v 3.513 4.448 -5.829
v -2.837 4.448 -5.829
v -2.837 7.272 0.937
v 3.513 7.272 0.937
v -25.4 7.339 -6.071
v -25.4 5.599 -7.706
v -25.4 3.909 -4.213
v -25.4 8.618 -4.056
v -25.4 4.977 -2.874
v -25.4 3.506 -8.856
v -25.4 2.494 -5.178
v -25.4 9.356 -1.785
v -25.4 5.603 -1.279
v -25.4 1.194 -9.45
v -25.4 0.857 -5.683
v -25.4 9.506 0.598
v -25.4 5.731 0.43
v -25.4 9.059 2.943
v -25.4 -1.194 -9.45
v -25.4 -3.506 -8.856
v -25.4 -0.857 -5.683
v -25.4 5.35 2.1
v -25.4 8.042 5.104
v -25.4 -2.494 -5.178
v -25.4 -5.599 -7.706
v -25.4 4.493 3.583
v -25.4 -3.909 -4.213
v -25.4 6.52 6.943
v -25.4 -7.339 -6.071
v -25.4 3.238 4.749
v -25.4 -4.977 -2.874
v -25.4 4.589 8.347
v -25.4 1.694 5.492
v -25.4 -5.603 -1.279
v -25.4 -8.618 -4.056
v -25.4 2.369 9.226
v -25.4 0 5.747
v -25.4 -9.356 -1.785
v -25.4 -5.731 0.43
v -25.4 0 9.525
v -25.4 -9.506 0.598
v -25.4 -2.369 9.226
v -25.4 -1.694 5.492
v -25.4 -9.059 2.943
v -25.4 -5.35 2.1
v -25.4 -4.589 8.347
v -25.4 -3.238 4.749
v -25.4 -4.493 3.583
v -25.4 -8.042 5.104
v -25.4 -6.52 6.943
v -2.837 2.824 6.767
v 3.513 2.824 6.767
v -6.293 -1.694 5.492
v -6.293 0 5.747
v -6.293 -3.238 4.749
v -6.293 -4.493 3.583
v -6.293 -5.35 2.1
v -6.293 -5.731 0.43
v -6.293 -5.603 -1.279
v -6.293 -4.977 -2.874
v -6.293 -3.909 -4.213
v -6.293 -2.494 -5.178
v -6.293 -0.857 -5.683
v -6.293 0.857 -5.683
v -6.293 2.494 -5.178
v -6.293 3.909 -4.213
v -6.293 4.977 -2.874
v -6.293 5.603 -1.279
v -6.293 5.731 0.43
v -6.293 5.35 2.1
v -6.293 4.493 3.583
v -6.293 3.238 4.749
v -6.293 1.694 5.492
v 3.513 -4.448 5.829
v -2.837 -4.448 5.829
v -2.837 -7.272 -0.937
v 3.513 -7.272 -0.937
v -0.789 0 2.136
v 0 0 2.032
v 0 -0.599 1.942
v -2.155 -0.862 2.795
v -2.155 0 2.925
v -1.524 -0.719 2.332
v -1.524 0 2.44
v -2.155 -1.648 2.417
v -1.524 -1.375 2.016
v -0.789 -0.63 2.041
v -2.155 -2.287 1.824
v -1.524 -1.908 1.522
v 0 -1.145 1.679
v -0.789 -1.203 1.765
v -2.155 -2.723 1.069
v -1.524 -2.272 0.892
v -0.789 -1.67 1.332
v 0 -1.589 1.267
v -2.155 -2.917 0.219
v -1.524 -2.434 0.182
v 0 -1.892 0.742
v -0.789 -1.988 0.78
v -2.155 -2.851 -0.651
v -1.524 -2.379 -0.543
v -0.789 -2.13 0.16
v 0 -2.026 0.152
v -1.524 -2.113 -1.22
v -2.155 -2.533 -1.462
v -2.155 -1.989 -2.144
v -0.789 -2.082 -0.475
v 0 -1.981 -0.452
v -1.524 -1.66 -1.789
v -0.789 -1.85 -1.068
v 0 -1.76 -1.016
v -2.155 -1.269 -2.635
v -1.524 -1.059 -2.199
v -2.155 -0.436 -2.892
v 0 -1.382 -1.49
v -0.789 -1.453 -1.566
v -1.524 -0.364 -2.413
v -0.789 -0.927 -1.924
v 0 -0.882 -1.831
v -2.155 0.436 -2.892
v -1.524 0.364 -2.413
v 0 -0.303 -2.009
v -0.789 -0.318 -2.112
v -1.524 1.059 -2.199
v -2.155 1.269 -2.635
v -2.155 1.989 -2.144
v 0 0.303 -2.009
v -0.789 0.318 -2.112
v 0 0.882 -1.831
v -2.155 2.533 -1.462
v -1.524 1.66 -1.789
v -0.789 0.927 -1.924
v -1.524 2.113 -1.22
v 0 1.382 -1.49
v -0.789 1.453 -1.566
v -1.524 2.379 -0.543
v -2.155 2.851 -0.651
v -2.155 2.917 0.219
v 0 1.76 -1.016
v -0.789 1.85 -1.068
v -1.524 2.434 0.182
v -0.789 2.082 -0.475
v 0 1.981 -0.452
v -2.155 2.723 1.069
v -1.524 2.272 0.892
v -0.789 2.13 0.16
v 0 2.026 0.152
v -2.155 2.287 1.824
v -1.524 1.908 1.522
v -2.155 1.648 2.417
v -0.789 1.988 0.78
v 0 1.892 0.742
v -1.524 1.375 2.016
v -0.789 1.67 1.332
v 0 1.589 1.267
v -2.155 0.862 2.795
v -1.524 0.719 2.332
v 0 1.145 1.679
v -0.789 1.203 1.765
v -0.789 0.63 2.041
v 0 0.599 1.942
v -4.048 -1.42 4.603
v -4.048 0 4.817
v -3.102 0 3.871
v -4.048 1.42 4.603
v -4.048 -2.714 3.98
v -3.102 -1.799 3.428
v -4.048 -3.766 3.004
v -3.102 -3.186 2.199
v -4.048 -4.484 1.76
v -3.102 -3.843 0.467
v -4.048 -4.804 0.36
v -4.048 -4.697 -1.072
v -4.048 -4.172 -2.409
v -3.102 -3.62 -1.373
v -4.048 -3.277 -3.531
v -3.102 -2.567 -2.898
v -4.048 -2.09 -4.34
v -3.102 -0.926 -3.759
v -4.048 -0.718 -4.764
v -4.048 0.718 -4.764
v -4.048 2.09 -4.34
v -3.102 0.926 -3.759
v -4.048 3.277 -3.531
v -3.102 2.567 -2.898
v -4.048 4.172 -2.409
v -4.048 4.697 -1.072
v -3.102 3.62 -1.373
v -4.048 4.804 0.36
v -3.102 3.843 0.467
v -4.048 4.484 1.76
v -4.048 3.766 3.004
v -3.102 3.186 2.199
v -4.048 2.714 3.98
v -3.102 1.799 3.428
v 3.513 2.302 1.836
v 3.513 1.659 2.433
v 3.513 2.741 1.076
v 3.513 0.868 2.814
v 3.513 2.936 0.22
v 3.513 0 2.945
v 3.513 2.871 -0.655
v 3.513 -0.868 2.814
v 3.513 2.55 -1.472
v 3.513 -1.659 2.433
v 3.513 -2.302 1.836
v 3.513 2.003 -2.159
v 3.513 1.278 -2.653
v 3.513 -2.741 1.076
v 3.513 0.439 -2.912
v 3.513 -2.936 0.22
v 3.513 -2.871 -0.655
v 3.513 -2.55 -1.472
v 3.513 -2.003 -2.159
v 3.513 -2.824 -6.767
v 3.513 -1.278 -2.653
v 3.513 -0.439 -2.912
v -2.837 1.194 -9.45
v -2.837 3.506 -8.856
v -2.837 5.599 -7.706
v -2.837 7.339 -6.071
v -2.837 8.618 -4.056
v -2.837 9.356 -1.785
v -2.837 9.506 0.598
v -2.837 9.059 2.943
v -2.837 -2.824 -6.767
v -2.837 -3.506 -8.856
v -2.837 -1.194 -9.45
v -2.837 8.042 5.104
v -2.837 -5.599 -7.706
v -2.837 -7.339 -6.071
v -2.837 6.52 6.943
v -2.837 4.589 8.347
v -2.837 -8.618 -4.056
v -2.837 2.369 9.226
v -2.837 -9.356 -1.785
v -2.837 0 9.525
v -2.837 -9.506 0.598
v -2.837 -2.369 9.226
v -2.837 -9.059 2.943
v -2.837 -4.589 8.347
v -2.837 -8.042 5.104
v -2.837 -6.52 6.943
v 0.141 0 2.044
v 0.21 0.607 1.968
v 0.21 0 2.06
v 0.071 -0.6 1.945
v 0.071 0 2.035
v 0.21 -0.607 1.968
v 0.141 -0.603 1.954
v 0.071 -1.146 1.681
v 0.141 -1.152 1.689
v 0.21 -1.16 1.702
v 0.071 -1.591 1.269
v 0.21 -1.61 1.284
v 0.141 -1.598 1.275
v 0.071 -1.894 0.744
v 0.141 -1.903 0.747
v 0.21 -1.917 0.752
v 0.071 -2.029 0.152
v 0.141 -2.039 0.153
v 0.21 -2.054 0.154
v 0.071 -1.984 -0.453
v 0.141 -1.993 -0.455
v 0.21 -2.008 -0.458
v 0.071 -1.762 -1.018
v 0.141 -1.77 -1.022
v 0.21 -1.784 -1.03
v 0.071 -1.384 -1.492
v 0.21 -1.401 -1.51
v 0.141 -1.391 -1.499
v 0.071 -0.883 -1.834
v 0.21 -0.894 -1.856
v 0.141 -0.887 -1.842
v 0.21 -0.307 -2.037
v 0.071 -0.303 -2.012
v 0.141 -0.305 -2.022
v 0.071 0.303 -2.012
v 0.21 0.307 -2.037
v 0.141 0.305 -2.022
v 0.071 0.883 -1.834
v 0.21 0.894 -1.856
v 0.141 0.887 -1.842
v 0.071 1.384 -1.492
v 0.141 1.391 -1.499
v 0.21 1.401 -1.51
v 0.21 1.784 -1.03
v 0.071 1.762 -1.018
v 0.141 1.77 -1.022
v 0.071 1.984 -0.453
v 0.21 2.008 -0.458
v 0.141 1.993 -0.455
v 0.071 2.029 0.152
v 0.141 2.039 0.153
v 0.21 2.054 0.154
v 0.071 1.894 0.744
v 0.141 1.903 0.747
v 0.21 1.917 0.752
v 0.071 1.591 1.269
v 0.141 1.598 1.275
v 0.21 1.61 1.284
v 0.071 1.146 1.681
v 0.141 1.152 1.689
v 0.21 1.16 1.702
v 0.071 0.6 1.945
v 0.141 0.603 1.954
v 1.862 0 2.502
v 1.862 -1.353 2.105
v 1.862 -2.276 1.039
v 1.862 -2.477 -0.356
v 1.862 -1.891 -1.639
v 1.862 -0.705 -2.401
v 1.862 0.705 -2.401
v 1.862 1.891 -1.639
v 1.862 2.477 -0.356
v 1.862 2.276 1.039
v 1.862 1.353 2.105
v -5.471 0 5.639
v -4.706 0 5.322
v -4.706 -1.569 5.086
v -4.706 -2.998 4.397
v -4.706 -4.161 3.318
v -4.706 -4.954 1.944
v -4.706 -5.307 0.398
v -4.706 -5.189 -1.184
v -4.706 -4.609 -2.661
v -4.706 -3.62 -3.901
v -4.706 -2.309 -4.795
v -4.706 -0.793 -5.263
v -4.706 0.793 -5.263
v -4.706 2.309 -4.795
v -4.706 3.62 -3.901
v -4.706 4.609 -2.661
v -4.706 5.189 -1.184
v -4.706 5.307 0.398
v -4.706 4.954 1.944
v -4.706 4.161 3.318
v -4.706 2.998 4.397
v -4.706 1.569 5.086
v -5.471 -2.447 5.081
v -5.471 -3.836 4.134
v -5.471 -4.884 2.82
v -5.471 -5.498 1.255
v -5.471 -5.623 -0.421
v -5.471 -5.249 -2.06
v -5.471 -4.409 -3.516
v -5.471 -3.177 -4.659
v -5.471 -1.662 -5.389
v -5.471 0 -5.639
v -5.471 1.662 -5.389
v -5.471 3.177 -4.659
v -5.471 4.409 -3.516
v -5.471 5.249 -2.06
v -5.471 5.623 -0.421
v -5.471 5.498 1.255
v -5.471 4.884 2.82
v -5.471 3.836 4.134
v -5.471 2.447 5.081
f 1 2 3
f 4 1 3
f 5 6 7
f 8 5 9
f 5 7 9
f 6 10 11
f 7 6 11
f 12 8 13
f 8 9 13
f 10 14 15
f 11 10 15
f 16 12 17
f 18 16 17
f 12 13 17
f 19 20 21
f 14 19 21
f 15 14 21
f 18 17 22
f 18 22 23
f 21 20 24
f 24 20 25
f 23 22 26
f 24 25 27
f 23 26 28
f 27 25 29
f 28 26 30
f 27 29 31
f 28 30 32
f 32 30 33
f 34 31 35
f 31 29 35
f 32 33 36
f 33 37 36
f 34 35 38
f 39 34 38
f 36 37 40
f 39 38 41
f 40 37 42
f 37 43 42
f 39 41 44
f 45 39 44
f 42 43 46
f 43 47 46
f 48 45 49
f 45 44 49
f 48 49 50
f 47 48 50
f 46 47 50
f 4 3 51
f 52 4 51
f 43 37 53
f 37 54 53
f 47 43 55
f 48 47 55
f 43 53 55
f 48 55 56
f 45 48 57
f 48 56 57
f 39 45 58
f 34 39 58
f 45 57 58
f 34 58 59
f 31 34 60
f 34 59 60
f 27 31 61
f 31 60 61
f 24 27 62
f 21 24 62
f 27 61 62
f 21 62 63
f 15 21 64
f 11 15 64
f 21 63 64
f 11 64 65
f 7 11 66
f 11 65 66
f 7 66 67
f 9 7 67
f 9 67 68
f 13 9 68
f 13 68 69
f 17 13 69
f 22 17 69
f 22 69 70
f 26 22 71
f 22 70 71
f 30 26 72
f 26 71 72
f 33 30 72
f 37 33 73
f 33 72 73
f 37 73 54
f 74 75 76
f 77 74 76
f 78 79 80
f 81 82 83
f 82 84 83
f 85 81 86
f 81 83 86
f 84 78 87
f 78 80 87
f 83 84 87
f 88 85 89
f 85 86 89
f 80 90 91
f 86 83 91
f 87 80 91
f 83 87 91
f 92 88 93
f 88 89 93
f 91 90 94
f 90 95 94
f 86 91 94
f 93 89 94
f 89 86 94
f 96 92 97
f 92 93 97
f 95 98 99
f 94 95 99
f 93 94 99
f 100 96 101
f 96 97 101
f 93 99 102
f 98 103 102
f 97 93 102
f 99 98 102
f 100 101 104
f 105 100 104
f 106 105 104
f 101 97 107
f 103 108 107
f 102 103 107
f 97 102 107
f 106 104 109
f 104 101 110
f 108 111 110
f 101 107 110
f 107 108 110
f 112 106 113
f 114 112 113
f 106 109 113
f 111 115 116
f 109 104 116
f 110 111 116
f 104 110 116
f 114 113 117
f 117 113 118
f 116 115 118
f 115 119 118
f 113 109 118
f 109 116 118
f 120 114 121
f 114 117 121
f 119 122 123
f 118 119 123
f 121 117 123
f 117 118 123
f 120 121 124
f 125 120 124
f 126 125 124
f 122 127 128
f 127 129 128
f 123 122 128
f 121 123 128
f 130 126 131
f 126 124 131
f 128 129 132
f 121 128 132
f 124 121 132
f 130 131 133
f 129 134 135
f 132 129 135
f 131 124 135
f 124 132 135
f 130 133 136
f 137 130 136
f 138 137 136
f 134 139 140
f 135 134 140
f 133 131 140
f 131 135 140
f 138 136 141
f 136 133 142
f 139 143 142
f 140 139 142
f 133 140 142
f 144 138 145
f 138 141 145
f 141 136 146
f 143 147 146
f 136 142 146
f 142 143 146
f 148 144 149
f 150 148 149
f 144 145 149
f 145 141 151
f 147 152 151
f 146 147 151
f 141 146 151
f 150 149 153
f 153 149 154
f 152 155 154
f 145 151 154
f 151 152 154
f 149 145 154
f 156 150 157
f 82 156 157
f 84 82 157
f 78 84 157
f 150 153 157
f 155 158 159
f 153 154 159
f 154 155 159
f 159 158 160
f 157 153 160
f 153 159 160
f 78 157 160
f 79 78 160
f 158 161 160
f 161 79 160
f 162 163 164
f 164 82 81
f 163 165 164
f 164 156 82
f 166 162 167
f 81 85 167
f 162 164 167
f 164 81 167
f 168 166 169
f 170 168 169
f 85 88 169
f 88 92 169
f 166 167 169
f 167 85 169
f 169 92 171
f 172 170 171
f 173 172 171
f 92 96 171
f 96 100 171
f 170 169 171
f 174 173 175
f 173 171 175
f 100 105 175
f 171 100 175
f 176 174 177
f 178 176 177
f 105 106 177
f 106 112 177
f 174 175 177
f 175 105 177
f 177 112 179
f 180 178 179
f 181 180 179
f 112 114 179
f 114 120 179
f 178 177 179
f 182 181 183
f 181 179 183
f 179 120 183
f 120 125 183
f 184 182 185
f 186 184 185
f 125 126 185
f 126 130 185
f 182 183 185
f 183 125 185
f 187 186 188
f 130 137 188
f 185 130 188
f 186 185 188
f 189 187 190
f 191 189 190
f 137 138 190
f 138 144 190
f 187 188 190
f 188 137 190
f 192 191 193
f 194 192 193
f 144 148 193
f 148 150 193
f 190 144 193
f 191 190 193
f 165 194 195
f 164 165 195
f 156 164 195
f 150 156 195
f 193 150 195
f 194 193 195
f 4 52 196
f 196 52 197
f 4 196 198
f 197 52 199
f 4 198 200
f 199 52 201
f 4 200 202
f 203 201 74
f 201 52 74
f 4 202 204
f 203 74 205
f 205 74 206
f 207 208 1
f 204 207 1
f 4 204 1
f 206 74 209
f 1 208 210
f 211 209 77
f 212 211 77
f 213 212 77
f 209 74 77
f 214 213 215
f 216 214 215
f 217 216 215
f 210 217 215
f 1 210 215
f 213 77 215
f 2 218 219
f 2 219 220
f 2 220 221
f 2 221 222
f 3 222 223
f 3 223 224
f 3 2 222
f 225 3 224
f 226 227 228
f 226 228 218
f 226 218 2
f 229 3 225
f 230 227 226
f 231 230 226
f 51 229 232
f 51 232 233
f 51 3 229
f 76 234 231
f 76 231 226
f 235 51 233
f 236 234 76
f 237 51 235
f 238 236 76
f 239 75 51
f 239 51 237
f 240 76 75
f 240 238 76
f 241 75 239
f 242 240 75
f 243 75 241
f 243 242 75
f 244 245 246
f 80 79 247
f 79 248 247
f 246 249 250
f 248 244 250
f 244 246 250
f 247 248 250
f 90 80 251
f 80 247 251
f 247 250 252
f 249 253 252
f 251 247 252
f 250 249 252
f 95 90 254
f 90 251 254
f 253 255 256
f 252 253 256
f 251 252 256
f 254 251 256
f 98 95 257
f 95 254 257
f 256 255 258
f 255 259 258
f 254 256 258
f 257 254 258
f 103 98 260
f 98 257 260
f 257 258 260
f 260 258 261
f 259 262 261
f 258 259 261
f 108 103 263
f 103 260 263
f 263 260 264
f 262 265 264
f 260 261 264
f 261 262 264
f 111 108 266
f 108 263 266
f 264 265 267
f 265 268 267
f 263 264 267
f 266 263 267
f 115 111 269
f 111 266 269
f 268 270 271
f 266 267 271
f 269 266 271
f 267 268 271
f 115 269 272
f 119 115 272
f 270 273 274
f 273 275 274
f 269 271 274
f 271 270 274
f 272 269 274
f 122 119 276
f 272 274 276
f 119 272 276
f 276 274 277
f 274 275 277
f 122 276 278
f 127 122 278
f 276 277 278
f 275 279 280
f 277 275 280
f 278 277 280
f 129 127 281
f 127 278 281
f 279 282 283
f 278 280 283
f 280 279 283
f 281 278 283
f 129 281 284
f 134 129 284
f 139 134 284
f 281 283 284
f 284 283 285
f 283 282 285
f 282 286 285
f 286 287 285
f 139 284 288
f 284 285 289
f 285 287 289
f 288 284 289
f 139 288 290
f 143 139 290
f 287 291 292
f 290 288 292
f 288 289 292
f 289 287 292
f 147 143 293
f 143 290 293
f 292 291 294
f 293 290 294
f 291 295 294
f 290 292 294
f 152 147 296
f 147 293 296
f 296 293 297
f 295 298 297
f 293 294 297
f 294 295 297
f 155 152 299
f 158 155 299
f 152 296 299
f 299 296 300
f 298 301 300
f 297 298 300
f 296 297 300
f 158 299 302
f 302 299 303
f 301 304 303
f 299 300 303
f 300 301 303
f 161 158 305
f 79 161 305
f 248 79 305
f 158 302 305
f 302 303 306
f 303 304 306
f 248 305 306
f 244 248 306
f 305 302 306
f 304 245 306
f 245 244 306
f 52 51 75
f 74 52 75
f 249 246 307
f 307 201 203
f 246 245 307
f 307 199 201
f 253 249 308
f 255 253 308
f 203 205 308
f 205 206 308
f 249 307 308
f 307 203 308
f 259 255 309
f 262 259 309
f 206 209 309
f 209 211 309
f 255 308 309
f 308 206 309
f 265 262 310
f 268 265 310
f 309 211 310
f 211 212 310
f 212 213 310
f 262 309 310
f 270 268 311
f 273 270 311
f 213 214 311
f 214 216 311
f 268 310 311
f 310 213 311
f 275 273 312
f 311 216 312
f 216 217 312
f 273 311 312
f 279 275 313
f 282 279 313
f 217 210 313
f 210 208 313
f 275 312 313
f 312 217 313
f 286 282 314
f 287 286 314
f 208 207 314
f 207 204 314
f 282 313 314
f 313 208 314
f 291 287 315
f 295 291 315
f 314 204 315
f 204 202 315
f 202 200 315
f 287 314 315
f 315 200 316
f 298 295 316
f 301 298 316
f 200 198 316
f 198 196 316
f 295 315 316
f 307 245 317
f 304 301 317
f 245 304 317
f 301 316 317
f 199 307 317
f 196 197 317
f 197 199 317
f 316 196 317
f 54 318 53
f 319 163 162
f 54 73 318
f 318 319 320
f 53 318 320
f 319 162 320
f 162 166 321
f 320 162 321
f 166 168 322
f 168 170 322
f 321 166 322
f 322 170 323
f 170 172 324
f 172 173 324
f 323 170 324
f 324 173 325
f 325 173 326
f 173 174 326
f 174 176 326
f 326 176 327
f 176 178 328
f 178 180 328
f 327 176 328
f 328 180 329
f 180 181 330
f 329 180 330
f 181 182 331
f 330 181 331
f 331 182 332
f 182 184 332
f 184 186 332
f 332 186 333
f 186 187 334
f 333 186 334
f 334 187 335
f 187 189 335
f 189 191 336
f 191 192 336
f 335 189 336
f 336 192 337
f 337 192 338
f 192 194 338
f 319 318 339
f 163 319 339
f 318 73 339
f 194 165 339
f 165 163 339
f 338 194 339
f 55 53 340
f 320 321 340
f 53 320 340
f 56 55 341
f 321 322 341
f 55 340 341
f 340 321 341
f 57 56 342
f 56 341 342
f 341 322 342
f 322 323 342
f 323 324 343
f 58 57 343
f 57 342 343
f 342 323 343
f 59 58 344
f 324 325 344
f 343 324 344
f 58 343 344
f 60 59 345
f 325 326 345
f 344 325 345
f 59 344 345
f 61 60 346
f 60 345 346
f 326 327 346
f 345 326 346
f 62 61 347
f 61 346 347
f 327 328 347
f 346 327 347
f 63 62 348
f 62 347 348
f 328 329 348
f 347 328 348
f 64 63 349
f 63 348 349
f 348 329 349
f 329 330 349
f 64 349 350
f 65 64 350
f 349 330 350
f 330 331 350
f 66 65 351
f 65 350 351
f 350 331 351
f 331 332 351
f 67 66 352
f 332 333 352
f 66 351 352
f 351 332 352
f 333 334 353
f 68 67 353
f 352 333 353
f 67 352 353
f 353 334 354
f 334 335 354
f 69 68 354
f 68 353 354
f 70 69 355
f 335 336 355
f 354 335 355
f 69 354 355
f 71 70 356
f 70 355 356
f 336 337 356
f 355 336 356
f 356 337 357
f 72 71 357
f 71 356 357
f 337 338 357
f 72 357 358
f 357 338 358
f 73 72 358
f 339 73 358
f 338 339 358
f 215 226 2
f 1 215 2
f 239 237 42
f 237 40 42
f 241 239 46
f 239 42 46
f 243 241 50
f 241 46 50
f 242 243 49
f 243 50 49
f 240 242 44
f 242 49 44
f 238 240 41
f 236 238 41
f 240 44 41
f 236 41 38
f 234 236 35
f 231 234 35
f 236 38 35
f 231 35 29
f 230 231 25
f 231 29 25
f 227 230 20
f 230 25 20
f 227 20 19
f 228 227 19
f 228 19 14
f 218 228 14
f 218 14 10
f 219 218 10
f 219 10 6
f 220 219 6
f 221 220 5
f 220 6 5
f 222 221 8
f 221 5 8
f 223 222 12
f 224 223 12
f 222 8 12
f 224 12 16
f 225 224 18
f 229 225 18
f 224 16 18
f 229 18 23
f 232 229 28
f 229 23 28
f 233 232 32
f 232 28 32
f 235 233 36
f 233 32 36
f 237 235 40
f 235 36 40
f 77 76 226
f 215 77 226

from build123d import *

# Parameters (mm, degrees)
CUT_EXTRUDE2_START = -6.35
SKETCH3_R          = 9.525
CUT_EXTRUDE2_DEPTH = 6.35


with BuildPart() as part:
    # Sketch1 → Revolve1 (revolve)
    with BuildSketch(Plane.XY, mode=Mode.PRIVATE) as revolve1_sk:
        with BuildLine():
            Line((0.21036812, 2.059695488), (3.51305494, 2.944647755))
            Line((3.51305494, 2.944647755), (3.51305494, 9.525))
            Line((3.51305494, 9.525), (-9.18694506, 9.525))
            Line((-9.18694506, 9.525), (-25.4, 9.525))
            Line((-25.4, 9.525), (-25.4, 5.747363917))
            Line((-25.4, 5.747363917), (-6.293014916, 5.747363917))
            ThreePointArc((-6.293014916, 5.747363917), (-5.077995018, 5.505681433), (-4.047950886, 4.817427948))
            Line((-4.047950886, 4.817427948), (-2.155261469, 2.924738531))
            ThreePointArc((-2.155261469, 2.924738531), (-1.166419102, 2.264015185), (0, 2.032))
            ThreePointArc((0, 2.032), (0.106091689, 2.038953617), (0.21036812, 2.059695488))
        make_face()
    revolve(revolve1_sk.sketch.rotate(Axis((0, 0, 0), (1, 0, 0)), 90), axis=Axis((0, 0, 0), (1, 0, 0)))

    # Sketch3 → Cut-Extrude2 (cut)
    with BuildSketch(Plane(origin=(3.51305494, 0, 0), x_dir=(0, 0, -1), z_dir=(1, 0, 0)).offset(CUT_EXTRUDE2_START)):
        with Locations(Location((0, 0, 0), (0, 0, 180))):
            Circle(SKETCH3_R)
        Polygon((-5.829170486, -4.447932641), (0.937437419, -7.272176044), (6.766607905, -2.824243403), (5.829170486, 4.447932641), (-0.937437419, 7.272176044), (-6.766607905, 2.824243403), align=None, mode=Mode.SUBTRACT)
    extrude(amount=CUT_EXTRUDE2_DEPTH, mode=Mode.SUBTRACT)


solid = part.part
